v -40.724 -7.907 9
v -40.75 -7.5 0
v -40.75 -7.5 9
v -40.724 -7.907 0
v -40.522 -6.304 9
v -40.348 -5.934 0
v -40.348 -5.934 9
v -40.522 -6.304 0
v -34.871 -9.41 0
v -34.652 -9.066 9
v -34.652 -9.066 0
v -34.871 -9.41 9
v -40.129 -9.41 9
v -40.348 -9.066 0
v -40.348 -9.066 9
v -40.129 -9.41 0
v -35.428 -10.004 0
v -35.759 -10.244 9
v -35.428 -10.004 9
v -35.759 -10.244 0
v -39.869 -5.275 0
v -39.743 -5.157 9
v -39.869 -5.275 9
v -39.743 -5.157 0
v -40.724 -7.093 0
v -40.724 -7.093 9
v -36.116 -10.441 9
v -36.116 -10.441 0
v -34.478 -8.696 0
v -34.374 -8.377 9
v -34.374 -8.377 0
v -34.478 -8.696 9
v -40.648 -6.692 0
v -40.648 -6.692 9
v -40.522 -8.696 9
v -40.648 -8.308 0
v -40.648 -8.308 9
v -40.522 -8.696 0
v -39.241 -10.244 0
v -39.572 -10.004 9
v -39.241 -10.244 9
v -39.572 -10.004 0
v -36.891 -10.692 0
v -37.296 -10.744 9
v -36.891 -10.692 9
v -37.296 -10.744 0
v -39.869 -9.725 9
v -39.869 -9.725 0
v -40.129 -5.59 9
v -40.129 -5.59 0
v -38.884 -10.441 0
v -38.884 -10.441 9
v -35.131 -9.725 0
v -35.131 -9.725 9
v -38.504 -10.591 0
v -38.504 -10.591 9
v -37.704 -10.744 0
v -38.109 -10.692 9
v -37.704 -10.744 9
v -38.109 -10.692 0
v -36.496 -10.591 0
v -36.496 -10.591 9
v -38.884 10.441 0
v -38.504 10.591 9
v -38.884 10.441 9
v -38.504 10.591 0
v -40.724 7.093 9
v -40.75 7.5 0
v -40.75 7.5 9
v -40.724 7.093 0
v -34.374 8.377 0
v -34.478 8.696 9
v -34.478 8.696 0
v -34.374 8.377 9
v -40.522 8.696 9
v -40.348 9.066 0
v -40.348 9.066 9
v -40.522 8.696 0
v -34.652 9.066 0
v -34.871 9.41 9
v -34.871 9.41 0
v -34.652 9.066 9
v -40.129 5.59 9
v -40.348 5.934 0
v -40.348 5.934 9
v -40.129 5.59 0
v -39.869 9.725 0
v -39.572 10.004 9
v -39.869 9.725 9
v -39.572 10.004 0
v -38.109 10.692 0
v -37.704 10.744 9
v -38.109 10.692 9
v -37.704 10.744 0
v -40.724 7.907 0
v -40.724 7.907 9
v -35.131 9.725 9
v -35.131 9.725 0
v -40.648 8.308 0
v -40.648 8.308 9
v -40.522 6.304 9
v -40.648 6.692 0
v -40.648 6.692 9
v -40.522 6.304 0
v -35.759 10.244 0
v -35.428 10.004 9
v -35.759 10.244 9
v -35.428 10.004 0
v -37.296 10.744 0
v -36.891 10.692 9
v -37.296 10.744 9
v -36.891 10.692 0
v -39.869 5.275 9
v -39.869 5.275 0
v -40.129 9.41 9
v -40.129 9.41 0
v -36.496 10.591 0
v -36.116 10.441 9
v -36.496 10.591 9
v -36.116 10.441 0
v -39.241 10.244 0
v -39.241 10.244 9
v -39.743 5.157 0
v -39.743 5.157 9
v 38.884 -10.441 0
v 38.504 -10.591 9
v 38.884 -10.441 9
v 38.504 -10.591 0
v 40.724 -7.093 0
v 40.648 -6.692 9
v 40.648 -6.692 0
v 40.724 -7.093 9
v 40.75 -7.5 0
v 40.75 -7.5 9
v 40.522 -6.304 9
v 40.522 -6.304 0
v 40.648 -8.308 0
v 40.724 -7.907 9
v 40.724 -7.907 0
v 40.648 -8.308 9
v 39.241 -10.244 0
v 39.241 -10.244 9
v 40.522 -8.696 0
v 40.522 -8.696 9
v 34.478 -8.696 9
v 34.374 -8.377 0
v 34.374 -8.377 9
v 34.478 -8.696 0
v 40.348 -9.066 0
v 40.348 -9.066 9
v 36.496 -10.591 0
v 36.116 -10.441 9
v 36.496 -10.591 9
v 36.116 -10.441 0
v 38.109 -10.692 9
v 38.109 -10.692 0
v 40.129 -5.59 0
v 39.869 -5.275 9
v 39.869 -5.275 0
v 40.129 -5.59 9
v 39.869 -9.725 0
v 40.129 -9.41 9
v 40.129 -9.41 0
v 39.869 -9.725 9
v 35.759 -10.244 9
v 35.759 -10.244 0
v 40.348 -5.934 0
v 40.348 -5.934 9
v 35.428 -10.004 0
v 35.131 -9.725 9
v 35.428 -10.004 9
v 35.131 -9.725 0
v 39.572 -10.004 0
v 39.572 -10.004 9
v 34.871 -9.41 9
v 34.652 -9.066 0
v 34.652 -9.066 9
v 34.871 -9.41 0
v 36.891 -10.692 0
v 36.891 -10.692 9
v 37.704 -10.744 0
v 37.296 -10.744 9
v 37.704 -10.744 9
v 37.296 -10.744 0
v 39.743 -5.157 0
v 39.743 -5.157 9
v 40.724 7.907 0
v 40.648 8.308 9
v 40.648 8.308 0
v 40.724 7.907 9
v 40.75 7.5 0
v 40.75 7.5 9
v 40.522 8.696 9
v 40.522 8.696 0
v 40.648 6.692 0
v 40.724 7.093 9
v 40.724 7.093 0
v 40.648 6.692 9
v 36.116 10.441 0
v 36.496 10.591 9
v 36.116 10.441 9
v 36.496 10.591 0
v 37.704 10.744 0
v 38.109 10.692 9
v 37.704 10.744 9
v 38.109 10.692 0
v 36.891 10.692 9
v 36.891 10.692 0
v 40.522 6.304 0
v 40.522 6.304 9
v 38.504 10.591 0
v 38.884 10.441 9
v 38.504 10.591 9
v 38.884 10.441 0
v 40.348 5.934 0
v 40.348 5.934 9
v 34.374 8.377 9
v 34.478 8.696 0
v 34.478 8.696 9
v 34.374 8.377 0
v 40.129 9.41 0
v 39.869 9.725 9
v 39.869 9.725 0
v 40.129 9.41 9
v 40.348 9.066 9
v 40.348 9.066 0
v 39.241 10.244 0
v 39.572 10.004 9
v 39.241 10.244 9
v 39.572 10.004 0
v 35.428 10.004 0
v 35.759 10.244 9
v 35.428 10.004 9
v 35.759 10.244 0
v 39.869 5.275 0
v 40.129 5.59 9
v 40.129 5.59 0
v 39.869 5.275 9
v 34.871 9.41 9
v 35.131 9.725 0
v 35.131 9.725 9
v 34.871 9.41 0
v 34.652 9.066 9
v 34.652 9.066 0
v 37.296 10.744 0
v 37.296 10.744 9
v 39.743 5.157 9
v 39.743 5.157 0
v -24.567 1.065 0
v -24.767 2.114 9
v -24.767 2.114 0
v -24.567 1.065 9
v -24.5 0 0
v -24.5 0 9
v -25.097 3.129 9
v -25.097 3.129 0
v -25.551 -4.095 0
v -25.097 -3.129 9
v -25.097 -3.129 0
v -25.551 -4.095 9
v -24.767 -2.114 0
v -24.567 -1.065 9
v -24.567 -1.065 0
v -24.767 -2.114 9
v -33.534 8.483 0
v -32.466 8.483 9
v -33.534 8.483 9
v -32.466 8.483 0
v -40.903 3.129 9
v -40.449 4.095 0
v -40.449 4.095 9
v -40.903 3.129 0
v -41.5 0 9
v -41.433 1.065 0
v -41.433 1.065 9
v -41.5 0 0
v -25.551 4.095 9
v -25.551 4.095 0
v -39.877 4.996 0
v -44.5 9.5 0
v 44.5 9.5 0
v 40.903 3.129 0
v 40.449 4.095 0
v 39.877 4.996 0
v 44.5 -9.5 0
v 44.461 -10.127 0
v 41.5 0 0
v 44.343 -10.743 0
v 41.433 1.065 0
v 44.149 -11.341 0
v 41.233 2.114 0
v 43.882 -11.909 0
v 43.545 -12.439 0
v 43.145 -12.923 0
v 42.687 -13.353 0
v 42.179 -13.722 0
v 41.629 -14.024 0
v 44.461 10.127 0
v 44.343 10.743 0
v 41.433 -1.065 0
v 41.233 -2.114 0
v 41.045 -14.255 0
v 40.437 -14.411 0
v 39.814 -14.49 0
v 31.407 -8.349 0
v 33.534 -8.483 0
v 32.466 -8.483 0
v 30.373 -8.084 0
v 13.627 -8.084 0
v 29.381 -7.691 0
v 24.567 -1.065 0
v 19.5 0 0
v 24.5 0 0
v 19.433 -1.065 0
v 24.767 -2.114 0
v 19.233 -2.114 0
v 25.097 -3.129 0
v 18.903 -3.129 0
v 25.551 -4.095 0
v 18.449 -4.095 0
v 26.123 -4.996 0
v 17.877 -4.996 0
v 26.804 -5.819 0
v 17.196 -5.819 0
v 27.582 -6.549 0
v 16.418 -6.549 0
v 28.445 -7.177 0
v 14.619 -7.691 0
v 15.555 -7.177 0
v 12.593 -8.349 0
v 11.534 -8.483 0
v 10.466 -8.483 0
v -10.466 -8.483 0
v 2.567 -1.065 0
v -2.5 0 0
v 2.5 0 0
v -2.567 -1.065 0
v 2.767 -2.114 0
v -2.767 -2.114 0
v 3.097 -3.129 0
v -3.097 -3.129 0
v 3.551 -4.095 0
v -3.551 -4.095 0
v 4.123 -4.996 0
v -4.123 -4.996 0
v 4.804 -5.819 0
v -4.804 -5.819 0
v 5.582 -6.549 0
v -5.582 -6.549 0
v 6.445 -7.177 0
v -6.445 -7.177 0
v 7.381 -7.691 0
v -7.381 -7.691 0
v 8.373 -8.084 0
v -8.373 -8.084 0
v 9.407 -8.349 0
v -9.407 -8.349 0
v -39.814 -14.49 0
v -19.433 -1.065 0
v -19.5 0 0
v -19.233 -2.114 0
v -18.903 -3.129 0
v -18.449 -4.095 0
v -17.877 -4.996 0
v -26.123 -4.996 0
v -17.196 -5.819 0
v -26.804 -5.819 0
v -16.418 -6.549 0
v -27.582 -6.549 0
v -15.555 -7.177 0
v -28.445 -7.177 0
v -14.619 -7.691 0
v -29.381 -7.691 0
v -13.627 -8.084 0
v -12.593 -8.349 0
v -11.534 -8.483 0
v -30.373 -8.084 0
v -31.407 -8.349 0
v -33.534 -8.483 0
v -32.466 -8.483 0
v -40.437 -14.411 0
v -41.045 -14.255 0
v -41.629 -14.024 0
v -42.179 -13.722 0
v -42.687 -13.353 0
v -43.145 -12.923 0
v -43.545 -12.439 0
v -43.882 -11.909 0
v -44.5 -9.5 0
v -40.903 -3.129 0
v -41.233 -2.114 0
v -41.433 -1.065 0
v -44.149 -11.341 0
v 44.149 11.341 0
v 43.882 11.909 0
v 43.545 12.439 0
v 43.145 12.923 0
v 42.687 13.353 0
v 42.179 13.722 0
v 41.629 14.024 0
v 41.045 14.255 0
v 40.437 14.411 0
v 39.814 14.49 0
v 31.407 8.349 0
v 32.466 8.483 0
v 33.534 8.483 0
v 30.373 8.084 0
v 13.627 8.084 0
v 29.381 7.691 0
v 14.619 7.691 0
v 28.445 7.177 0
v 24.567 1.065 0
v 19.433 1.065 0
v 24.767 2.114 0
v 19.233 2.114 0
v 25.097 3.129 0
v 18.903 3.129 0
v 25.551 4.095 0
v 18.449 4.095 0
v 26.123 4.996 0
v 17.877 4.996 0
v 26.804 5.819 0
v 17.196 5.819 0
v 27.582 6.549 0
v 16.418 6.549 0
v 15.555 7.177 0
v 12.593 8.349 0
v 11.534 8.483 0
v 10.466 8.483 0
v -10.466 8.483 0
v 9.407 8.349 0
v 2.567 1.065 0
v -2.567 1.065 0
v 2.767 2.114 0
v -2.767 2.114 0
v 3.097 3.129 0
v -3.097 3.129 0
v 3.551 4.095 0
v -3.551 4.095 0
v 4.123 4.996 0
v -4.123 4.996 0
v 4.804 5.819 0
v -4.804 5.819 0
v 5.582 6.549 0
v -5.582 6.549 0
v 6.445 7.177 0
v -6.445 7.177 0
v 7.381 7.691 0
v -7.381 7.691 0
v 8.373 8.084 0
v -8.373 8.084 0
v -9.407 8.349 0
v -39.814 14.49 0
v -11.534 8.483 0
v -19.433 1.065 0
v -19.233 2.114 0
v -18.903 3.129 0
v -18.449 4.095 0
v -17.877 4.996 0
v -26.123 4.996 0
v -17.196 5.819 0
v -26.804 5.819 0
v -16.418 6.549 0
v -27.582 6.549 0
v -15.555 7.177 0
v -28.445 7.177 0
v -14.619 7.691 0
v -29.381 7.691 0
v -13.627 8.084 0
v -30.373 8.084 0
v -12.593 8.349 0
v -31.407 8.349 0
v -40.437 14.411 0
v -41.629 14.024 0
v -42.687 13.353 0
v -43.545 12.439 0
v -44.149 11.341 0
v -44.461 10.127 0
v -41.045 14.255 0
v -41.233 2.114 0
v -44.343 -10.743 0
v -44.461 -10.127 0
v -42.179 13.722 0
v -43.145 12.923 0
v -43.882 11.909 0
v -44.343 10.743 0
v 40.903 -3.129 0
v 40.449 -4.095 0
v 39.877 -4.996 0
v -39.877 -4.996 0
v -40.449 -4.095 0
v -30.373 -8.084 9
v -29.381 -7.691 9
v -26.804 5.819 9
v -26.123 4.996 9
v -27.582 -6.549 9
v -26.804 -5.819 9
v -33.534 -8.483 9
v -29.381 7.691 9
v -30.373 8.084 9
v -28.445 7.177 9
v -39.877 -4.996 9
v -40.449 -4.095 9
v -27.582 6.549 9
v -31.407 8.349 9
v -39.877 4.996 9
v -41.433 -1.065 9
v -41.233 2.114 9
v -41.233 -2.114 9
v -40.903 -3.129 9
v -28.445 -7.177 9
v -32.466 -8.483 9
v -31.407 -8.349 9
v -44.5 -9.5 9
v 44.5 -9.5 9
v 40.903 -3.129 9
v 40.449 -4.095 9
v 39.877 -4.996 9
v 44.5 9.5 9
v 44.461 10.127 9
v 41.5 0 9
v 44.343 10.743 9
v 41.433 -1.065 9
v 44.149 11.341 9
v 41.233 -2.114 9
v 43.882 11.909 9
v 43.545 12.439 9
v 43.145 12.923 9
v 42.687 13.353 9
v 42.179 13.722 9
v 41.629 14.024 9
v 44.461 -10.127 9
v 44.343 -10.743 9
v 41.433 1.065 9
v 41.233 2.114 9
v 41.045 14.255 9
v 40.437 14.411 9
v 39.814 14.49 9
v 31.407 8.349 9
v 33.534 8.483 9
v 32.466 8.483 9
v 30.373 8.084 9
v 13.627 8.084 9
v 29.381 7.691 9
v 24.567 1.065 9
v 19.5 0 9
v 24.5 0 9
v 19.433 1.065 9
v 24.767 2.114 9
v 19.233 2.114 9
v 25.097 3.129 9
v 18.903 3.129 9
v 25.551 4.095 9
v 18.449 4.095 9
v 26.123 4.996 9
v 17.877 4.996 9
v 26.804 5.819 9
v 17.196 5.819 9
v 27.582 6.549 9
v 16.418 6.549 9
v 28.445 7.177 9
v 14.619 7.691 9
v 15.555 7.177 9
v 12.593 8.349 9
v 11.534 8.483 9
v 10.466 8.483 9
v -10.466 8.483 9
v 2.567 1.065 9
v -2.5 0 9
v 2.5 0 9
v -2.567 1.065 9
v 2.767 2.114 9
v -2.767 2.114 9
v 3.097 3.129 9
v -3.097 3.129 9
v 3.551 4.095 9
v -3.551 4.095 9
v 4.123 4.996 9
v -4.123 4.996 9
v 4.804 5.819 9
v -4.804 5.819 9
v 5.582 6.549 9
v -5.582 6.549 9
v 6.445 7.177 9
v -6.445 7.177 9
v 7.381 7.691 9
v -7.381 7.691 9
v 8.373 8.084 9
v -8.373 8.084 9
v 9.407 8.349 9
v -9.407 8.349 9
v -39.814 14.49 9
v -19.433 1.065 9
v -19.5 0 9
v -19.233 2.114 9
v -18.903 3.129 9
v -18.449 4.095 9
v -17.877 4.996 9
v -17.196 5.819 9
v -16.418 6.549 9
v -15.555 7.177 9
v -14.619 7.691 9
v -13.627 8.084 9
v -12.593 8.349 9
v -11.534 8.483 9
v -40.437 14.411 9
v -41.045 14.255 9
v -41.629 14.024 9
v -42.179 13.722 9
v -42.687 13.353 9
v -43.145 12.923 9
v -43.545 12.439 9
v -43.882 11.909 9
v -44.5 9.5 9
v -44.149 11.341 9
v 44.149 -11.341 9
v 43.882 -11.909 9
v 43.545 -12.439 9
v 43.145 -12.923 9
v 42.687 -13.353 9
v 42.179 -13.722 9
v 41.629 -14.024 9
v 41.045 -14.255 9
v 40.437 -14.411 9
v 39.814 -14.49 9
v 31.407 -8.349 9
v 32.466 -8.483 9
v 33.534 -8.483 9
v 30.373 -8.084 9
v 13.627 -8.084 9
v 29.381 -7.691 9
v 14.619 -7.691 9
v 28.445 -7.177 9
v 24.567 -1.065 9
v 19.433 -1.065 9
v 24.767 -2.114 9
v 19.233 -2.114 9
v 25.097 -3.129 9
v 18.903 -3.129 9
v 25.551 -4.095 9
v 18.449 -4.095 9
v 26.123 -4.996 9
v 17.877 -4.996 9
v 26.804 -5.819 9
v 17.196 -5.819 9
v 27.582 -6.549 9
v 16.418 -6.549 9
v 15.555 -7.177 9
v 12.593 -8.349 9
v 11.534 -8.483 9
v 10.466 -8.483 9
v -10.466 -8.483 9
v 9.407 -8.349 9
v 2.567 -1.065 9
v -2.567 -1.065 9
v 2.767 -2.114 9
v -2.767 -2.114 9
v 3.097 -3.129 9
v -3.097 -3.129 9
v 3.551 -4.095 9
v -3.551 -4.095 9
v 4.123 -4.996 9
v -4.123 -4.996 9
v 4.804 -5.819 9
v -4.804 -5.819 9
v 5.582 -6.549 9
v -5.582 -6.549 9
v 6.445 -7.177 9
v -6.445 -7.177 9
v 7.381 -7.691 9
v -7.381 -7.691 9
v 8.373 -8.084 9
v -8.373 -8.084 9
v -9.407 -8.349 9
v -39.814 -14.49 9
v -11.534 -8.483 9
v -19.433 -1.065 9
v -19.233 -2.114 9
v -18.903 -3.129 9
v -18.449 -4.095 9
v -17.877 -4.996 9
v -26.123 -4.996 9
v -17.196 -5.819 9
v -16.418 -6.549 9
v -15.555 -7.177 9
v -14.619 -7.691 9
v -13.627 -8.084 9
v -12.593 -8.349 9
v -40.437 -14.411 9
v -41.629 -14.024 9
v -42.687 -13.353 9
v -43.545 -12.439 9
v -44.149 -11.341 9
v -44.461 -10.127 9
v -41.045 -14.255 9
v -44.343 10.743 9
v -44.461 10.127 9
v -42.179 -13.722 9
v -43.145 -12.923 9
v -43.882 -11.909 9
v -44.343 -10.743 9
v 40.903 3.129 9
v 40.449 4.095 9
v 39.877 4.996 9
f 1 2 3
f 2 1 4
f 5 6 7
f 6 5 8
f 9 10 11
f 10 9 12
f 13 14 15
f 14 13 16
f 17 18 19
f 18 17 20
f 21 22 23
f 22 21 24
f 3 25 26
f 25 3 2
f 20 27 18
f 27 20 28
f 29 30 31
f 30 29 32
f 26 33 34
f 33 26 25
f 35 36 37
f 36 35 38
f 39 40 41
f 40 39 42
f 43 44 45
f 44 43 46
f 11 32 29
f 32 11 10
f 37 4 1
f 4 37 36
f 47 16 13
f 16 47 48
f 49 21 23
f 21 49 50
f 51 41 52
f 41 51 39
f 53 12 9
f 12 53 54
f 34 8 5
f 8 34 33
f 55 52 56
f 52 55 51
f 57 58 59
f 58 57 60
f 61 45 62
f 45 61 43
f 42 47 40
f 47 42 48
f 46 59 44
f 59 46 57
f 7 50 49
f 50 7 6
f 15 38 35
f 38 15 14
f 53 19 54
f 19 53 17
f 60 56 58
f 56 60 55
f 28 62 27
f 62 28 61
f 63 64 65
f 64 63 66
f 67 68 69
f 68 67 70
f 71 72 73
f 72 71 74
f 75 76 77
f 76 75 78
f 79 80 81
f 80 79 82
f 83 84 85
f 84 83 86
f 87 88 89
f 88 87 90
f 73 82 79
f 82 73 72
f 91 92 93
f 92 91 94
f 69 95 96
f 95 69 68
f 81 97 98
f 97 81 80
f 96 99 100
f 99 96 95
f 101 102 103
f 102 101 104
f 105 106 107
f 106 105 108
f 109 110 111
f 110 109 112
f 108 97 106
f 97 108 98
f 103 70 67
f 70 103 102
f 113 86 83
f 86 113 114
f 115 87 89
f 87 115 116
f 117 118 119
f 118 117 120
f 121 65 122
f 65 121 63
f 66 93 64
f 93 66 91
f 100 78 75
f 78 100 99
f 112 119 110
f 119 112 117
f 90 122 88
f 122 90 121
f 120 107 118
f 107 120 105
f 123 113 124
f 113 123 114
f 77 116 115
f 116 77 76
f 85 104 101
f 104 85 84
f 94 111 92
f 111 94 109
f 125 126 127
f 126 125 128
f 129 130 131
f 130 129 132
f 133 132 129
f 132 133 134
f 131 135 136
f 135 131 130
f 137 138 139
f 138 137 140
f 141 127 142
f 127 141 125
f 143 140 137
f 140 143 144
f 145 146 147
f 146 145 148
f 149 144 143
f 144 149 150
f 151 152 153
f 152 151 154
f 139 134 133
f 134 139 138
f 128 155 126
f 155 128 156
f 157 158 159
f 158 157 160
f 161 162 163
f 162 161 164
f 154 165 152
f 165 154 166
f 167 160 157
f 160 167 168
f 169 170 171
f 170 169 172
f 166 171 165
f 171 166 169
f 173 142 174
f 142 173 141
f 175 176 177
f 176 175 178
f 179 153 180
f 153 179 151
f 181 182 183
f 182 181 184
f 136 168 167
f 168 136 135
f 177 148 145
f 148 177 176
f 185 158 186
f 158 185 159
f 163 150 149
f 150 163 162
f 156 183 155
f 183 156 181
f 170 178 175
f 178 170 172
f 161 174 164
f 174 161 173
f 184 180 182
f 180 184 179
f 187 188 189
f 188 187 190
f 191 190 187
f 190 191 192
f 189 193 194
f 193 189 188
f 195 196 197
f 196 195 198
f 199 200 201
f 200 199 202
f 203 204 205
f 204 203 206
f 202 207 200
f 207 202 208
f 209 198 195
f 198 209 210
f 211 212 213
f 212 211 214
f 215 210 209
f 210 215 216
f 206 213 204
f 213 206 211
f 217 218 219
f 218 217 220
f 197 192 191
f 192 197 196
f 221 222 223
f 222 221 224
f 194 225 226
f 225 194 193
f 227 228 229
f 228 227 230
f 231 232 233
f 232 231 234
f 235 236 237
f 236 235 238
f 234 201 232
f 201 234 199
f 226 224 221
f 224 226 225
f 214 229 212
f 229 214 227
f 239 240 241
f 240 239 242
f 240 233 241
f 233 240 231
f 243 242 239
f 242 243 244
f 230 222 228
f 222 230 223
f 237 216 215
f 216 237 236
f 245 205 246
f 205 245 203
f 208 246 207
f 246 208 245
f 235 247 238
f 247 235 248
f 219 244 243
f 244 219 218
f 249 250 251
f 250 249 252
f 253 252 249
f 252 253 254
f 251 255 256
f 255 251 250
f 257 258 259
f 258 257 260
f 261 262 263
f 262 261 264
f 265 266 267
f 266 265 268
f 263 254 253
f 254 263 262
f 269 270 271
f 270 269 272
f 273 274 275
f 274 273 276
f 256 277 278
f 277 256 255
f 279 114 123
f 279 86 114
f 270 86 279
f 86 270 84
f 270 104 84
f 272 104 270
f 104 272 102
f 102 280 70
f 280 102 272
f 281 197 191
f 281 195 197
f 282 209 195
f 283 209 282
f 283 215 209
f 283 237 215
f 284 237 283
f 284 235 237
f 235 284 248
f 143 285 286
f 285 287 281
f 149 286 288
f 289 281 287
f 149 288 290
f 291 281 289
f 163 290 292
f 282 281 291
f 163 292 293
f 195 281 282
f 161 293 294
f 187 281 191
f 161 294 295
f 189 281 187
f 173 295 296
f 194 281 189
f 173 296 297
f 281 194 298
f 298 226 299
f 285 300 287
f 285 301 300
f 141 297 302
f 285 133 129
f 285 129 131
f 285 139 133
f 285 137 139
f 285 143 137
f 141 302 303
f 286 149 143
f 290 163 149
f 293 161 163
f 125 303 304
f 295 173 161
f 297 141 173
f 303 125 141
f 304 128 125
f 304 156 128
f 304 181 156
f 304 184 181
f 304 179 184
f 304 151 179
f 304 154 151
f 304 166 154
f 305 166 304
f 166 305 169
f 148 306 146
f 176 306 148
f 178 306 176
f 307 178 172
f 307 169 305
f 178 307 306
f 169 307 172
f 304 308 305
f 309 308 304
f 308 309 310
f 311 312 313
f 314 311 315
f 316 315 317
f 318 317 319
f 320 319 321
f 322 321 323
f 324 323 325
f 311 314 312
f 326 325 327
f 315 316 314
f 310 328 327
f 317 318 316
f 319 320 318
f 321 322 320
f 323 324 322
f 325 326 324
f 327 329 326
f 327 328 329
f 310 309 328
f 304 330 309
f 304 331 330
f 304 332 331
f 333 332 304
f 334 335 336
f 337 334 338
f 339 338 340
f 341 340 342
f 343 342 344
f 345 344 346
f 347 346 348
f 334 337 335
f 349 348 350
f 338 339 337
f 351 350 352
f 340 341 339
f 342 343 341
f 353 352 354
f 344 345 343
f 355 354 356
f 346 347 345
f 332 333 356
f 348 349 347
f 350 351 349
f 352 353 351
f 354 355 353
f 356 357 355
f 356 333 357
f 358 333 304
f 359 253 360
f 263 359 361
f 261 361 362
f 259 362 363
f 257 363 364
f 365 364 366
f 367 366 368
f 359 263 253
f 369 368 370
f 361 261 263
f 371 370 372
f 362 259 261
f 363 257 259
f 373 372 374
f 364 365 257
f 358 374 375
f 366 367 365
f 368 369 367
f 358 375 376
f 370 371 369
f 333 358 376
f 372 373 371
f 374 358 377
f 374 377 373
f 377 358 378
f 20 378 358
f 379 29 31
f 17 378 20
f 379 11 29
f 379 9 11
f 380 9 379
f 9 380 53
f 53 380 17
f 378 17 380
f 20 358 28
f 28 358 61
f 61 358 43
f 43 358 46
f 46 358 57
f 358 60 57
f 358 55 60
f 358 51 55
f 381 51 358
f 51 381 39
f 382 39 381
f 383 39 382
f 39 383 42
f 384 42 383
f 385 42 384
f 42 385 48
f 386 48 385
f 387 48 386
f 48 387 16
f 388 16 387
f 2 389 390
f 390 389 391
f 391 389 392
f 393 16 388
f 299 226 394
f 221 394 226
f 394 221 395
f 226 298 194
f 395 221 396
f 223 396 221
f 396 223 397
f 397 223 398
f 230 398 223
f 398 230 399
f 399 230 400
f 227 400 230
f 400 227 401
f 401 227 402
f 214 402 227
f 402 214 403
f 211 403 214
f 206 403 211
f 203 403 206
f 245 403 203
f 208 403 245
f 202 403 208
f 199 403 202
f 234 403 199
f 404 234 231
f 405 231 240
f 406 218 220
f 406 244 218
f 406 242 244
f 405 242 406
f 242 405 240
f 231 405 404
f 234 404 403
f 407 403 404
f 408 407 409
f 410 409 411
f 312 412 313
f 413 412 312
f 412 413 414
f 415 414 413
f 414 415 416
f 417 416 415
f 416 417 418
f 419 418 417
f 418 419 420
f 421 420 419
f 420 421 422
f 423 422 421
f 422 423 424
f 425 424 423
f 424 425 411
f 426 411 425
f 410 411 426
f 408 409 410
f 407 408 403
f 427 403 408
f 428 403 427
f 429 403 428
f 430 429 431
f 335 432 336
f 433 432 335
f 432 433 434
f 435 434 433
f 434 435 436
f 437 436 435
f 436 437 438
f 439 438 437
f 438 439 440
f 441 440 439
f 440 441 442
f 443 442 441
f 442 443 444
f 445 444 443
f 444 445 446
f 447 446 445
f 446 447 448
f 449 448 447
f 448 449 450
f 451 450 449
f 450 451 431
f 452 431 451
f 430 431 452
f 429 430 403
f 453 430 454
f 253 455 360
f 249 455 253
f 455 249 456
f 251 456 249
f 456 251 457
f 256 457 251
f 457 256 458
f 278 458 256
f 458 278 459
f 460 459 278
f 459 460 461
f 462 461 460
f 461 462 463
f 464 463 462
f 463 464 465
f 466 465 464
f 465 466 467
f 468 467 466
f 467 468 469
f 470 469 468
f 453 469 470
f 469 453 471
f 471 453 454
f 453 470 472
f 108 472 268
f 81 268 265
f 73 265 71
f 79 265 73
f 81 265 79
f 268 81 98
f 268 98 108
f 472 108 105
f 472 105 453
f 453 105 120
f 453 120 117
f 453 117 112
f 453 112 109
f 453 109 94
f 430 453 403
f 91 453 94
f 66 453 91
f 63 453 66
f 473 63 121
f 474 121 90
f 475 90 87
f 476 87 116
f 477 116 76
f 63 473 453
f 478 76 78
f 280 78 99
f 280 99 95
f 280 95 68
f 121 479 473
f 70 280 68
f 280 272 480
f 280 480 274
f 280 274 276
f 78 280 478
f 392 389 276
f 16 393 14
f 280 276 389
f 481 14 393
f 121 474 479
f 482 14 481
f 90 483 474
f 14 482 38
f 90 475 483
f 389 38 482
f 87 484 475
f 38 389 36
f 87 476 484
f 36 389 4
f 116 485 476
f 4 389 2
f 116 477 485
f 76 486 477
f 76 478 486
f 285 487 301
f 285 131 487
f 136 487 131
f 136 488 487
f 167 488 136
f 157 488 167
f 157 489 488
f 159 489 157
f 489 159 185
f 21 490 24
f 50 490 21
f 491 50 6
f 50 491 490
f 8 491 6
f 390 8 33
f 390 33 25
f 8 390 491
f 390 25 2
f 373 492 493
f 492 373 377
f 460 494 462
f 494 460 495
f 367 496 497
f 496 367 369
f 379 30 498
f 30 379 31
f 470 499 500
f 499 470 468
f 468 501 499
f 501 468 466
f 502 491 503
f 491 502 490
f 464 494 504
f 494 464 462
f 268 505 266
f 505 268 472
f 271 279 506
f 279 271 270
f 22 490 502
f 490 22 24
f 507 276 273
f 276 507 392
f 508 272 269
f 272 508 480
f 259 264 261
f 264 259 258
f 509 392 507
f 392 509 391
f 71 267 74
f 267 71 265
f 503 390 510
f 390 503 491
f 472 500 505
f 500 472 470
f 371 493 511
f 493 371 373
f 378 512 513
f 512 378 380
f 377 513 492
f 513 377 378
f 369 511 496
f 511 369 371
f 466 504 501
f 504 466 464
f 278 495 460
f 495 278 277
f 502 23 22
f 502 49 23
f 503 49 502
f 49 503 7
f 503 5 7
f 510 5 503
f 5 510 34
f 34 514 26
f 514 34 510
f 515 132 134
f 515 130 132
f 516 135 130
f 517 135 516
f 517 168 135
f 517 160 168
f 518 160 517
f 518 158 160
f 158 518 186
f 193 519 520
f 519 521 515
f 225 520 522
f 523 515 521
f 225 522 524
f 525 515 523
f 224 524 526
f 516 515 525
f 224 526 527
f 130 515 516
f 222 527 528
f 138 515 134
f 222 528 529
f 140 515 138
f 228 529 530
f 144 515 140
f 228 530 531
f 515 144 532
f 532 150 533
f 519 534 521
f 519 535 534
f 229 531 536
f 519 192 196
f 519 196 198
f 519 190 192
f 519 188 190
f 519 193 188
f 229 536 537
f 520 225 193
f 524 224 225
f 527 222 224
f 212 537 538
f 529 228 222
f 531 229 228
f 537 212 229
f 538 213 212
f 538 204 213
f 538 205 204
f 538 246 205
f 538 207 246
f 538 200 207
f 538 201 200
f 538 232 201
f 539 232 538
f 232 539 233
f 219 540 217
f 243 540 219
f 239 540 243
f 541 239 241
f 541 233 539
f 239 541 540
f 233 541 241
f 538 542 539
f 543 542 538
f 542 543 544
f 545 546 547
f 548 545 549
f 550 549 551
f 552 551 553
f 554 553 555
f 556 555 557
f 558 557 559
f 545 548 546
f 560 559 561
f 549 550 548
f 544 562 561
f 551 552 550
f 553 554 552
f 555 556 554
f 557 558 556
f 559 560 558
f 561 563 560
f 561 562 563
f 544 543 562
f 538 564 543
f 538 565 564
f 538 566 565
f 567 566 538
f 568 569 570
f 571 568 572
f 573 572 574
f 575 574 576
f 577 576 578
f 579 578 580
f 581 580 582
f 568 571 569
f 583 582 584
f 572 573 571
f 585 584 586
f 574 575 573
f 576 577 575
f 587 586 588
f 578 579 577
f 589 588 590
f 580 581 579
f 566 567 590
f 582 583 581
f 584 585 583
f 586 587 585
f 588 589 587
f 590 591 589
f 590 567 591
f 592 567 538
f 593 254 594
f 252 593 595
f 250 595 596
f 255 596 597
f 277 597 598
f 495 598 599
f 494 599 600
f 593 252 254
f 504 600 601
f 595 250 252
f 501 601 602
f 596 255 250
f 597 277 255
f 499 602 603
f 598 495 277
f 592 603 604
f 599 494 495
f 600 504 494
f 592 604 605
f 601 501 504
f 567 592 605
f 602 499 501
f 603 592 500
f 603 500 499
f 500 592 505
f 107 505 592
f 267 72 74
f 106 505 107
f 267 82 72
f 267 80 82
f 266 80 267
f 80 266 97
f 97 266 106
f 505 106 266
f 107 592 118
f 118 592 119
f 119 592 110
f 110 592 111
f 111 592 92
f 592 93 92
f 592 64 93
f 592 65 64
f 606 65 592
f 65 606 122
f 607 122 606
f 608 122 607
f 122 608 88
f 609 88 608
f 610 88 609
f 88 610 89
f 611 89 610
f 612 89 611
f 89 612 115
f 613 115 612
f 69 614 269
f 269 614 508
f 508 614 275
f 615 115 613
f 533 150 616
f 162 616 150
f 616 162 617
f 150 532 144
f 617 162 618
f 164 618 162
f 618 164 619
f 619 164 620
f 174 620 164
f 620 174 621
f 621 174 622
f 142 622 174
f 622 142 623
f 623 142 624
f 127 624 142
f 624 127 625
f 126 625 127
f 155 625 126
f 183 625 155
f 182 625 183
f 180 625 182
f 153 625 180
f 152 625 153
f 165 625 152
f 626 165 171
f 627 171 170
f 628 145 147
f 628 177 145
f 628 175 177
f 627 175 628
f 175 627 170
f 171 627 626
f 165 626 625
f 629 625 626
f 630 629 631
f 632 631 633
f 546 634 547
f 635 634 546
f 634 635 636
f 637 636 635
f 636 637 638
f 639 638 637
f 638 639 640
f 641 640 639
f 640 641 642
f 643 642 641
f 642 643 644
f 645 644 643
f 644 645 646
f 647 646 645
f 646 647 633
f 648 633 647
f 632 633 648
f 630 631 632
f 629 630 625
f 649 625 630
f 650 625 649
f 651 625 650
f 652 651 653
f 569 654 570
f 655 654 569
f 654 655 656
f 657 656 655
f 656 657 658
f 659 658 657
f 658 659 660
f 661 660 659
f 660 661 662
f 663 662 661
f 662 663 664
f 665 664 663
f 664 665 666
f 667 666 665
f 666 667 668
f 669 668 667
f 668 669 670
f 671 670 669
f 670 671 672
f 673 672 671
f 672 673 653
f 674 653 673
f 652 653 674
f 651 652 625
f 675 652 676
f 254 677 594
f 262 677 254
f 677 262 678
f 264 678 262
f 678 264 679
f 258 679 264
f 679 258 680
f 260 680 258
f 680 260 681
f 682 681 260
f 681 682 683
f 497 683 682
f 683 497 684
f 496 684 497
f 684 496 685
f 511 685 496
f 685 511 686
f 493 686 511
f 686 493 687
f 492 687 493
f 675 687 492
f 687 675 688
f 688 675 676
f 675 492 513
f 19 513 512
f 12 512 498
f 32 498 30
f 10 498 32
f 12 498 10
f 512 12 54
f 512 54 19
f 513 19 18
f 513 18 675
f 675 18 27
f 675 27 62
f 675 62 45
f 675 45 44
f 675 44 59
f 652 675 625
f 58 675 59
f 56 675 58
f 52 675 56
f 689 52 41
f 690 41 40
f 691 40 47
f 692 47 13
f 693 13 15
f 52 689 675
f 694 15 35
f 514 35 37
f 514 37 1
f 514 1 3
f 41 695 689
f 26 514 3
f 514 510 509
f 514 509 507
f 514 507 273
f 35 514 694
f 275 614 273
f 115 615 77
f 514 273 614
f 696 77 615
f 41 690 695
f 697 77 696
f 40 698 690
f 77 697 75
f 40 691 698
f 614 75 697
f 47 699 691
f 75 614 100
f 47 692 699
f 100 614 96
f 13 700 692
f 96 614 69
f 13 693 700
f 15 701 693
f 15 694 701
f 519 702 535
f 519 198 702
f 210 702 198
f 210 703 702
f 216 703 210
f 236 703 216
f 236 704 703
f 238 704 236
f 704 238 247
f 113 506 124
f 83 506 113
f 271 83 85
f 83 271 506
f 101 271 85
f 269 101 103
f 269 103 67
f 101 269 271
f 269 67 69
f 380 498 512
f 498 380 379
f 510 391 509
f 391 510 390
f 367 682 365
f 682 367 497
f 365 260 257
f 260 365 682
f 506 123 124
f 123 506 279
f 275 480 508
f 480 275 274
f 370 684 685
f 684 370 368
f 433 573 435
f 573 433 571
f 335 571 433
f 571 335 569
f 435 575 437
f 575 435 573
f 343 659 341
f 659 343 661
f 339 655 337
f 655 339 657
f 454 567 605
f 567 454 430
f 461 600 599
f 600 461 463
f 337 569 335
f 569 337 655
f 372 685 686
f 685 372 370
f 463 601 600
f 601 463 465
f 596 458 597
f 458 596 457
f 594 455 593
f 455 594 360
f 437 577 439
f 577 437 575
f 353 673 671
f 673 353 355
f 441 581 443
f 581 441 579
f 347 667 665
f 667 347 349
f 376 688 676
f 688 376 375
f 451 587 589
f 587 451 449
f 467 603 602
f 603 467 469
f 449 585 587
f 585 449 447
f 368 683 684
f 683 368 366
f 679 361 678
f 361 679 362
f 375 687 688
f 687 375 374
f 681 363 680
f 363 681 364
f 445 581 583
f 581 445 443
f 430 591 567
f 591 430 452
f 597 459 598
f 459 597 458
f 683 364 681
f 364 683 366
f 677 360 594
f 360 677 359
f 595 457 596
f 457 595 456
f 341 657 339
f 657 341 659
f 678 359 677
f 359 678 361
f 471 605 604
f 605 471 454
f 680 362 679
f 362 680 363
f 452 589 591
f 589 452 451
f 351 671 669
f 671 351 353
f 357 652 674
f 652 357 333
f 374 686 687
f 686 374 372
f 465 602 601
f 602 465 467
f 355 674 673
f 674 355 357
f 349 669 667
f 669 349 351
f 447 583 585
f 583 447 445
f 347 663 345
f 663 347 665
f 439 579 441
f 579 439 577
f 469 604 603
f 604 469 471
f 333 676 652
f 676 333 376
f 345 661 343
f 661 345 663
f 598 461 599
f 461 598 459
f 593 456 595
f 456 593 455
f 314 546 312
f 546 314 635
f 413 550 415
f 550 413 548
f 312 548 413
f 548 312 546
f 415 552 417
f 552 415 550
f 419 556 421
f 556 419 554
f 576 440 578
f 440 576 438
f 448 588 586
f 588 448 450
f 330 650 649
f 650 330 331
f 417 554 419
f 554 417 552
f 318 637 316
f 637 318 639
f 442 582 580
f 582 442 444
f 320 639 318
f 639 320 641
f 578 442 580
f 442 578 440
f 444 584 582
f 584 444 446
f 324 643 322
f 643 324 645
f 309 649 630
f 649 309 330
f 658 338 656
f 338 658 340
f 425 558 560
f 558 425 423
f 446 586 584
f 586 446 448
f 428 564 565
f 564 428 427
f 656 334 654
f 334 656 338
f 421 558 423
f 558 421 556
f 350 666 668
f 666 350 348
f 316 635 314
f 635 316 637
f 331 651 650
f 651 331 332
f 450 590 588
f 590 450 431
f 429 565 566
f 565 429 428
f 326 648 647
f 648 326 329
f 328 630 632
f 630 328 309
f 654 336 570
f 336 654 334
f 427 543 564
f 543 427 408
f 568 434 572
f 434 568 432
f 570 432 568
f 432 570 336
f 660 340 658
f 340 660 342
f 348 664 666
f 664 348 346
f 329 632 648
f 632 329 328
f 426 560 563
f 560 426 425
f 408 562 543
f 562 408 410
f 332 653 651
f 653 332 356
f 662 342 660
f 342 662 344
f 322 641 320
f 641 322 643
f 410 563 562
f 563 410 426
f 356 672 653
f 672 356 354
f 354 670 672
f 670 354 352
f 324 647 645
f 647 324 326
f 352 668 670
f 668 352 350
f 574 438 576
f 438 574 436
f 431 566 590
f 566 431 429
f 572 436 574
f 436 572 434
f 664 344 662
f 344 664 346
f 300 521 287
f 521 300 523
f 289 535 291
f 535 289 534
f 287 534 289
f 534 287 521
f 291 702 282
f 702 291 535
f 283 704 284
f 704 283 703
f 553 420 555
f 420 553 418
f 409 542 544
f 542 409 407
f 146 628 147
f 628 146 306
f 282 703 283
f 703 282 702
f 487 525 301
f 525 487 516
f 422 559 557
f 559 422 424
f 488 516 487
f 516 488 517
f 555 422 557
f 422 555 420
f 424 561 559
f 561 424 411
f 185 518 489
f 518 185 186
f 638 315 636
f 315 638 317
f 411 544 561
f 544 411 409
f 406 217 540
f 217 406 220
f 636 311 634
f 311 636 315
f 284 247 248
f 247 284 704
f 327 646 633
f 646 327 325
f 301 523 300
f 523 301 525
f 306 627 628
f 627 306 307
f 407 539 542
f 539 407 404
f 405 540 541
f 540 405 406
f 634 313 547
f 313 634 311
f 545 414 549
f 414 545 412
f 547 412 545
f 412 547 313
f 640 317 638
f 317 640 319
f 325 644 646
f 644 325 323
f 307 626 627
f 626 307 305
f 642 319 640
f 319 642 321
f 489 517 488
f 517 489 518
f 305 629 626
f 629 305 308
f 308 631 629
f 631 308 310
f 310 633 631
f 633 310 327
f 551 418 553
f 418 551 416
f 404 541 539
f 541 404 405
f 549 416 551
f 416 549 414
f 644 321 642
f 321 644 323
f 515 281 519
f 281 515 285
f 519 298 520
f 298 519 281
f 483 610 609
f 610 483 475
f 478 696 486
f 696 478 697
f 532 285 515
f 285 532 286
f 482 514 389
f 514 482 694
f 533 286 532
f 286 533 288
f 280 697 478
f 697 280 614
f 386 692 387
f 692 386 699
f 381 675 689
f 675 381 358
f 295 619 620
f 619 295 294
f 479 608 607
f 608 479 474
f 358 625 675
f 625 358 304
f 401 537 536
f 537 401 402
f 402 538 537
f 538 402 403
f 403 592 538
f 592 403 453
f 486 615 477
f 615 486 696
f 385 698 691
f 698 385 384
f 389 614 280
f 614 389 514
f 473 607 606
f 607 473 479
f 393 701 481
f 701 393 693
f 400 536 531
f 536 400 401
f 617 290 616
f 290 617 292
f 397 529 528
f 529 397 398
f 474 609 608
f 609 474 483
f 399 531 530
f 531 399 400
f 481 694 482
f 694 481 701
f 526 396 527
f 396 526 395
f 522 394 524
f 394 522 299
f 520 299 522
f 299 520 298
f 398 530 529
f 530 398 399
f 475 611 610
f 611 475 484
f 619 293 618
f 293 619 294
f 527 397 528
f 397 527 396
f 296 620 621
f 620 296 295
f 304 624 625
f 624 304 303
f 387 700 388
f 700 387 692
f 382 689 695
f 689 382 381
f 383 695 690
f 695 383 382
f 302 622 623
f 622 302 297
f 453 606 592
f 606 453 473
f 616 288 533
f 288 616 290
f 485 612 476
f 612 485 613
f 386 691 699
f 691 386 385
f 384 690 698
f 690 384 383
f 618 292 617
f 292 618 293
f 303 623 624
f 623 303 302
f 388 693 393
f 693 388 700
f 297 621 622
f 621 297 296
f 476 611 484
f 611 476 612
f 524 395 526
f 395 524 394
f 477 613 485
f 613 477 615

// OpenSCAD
$fn = 50;


difference() {
	union() {
		hull() {
			translate(v = [-39.5000000000, 9.5000000000, 0]) {
				cylinder(h = 9, r = 5);
			}
			translate(v = [39.5000000000, 9.5000000000, 0]) {
				cylinder(h = 9, r = 5);
			}
			translate(v = [-39.5000000000, -9.5000000000, 0]) {
				cylinder(h = 9, r = 5);
			}
			translate(v = [39.5000000000, -9.5000000000, 0]) {
				cylinder(h = 9, r = 5);
			}
		}
	}
	union() {
		#translate(v = [-37.5000000000, -7.5000000000, -100.0000000000]) {
			cylinder(h = 200, r = 3.2500000000);
		}
		#translate(v = [-37.5000000000, 7.5000000000, -100.0000000000]) {
			cylinder(h = 200, r = 3.2500000000);
		}
		#translate(v = [37.5000000000, -7.5000000000, -100.0000000000]) {
			cylinder(h = 200, r = 3.2500000000);
		}
		#translate(v = [37.5000000000, 7.5000000000, -100.0000000000]) {
			cylinder(h = 200, r = 3.2500000000);
		}
		#translate(v = [-33.0000000000, 0, 0]) {
			cylinder(h = 9, r = 8.5000000000);
		}
		#translate(v = [-11.0000000000, 0, 0]) {
			cylinder(h = 9, r = 8.5000000000);
		}
		#translate(v = [11.0000000000, 0, 0]) {
			cylinder(h = 9, r = 8.5000000000);
		}
		#translate(v = [33.0000000000, 0, 0]) {
			cylinder(h = 9, r = 8.5000000000);
		}
	}
}
